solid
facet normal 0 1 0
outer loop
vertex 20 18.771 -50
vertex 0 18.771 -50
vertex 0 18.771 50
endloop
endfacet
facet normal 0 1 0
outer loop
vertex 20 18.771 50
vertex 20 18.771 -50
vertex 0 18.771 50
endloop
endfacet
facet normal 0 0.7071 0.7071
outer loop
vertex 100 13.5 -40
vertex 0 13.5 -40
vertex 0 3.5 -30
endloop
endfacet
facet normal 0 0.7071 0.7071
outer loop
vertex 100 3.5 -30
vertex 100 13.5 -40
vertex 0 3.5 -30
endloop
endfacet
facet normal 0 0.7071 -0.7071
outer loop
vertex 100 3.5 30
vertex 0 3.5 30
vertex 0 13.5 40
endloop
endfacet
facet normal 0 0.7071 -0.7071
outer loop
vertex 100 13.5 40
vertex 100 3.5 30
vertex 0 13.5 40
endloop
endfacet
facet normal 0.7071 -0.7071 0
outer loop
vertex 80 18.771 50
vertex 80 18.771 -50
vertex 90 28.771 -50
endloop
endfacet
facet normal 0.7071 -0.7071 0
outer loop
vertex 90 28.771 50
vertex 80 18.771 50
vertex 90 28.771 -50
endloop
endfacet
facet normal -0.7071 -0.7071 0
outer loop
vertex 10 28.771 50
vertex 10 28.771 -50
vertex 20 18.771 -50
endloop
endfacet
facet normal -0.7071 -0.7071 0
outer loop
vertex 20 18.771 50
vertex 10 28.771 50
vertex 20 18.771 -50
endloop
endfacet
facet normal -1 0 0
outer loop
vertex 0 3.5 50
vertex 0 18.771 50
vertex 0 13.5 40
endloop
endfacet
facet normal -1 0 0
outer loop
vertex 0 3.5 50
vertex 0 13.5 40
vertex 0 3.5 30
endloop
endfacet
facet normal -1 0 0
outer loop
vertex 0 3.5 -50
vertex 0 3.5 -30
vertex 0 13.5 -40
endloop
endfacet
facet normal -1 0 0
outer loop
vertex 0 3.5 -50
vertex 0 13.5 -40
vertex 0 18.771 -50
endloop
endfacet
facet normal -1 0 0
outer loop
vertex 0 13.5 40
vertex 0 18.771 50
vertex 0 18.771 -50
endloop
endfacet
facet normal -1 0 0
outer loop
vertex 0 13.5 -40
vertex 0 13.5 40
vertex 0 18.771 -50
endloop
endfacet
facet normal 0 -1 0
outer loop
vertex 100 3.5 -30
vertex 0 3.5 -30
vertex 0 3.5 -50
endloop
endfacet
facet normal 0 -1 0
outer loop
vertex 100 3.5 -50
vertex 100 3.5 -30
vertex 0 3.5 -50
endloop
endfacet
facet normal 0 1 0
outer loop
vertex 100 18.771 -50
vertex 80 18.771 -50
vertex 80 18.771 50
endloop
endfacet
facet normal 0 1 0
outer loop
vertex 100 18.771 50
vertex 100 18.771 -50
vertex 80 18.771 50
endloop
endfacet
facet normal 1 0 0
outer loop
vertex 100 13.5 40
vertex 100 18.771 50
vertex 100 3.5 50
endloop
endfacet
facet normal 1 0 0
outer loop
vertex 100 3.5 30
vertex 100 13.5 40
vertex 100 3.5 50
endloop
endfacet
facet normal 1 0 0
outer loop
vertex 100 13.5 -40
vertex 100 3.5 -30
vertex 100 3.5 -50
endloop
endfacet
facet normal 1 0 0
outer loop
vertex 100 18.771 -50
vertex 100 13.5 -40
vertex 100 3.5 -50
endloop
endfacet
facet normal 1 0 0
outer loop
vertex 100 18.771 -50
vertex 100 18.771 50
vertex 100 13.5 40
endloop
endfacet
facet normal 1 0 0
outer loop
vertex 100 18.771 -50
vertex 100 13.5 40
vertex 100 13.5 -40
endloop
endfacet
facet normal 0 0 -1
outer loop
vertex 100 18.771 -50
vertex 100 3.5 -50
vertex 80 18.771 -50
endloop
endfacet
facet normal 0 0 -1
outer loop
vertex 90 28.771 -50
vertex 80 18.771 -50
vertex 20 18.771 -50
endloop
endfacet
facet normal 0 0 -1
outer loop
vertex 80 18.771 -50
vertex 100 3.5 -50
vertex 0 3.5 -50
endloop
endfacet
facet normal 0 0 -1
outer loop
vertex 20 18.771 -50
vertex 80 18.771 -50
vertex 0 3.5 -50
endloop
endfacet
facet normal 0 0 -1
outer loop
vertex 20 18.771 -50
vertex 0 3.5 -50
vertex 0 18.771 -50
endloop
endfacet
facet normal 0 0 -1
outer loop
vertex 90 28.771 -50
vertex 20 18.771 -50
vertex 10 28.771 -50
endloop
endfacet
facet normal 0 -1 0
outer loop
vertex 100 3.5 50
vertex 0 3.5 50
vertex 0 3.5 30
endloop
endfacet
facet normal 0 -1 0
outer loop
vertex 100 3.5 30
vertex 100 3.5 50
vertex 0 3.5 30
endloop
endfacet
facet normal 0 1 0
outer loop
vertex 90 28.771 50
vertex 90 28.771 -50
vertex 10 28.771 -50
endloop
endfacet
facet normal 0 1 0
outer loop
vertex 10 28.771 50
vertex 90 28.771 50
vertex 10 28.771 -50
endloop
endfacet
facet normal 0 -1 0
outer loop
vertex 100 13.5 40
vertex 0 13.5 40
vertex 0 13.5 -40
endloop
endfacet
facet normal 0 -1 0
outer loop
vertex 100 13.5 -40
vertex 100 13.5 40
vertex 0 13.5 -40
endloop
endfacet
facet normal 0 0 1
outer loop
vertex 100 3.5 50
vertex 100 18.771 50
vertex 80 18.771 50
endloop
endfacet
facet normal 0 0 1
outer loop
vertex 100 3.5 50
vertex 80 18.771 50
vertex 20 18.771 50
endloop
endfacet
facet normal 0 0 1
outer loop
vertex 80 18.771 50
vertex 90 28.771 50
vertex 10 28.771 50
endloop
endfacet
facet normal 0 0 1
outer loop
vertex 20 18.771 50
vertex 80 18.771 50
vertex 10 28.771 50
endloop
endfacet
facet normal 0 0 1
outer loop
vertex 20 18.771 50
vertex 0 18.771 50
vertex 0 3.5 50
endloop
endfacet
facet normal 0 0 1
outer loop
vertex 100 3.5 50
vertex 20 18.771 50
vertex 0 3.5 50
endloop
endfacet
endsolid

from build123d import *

# Parameters (mm, degrees)
SALIENTE_EXTRUIR1_DEPTH = 100
SALIENTE_EXTRUIR2_DEPTH = 100


with BuildPart() as part:
    # Croquis1 → Saliente-Extruir1 (new body)
    with BuildSketch(Plane(origin=(0, 0, 0), x_dir=(0, 0, -1), z_dir=(1, 0, 0))):
        Polygon((-30, 3.5), (-40, 13.5), (40, 13.5), (30, 3.5), (50, 3.5), (50, 18.770945102), (-50, 18.770945102), (-50, 3.5), align=None)
    extrude(amount=SALIENTE_EXTRUIR1_DEPTH)

    # Croquis2 → Saliente-Extruir2 (add)
    with BuildSketch(Plane(origin=(0, 0, -50), x_dir=(-1, 0, 0), z_dir=(0, 0, -1))):
        Polygon((-80, 18.770945102), (-90, 28.770945102), (-10, 28.770945102), (-20, 18.770945102), align=None)
    extrude(amount=-SALIENTE_EXTRUIR2_DEPTH)


solid = part.part
